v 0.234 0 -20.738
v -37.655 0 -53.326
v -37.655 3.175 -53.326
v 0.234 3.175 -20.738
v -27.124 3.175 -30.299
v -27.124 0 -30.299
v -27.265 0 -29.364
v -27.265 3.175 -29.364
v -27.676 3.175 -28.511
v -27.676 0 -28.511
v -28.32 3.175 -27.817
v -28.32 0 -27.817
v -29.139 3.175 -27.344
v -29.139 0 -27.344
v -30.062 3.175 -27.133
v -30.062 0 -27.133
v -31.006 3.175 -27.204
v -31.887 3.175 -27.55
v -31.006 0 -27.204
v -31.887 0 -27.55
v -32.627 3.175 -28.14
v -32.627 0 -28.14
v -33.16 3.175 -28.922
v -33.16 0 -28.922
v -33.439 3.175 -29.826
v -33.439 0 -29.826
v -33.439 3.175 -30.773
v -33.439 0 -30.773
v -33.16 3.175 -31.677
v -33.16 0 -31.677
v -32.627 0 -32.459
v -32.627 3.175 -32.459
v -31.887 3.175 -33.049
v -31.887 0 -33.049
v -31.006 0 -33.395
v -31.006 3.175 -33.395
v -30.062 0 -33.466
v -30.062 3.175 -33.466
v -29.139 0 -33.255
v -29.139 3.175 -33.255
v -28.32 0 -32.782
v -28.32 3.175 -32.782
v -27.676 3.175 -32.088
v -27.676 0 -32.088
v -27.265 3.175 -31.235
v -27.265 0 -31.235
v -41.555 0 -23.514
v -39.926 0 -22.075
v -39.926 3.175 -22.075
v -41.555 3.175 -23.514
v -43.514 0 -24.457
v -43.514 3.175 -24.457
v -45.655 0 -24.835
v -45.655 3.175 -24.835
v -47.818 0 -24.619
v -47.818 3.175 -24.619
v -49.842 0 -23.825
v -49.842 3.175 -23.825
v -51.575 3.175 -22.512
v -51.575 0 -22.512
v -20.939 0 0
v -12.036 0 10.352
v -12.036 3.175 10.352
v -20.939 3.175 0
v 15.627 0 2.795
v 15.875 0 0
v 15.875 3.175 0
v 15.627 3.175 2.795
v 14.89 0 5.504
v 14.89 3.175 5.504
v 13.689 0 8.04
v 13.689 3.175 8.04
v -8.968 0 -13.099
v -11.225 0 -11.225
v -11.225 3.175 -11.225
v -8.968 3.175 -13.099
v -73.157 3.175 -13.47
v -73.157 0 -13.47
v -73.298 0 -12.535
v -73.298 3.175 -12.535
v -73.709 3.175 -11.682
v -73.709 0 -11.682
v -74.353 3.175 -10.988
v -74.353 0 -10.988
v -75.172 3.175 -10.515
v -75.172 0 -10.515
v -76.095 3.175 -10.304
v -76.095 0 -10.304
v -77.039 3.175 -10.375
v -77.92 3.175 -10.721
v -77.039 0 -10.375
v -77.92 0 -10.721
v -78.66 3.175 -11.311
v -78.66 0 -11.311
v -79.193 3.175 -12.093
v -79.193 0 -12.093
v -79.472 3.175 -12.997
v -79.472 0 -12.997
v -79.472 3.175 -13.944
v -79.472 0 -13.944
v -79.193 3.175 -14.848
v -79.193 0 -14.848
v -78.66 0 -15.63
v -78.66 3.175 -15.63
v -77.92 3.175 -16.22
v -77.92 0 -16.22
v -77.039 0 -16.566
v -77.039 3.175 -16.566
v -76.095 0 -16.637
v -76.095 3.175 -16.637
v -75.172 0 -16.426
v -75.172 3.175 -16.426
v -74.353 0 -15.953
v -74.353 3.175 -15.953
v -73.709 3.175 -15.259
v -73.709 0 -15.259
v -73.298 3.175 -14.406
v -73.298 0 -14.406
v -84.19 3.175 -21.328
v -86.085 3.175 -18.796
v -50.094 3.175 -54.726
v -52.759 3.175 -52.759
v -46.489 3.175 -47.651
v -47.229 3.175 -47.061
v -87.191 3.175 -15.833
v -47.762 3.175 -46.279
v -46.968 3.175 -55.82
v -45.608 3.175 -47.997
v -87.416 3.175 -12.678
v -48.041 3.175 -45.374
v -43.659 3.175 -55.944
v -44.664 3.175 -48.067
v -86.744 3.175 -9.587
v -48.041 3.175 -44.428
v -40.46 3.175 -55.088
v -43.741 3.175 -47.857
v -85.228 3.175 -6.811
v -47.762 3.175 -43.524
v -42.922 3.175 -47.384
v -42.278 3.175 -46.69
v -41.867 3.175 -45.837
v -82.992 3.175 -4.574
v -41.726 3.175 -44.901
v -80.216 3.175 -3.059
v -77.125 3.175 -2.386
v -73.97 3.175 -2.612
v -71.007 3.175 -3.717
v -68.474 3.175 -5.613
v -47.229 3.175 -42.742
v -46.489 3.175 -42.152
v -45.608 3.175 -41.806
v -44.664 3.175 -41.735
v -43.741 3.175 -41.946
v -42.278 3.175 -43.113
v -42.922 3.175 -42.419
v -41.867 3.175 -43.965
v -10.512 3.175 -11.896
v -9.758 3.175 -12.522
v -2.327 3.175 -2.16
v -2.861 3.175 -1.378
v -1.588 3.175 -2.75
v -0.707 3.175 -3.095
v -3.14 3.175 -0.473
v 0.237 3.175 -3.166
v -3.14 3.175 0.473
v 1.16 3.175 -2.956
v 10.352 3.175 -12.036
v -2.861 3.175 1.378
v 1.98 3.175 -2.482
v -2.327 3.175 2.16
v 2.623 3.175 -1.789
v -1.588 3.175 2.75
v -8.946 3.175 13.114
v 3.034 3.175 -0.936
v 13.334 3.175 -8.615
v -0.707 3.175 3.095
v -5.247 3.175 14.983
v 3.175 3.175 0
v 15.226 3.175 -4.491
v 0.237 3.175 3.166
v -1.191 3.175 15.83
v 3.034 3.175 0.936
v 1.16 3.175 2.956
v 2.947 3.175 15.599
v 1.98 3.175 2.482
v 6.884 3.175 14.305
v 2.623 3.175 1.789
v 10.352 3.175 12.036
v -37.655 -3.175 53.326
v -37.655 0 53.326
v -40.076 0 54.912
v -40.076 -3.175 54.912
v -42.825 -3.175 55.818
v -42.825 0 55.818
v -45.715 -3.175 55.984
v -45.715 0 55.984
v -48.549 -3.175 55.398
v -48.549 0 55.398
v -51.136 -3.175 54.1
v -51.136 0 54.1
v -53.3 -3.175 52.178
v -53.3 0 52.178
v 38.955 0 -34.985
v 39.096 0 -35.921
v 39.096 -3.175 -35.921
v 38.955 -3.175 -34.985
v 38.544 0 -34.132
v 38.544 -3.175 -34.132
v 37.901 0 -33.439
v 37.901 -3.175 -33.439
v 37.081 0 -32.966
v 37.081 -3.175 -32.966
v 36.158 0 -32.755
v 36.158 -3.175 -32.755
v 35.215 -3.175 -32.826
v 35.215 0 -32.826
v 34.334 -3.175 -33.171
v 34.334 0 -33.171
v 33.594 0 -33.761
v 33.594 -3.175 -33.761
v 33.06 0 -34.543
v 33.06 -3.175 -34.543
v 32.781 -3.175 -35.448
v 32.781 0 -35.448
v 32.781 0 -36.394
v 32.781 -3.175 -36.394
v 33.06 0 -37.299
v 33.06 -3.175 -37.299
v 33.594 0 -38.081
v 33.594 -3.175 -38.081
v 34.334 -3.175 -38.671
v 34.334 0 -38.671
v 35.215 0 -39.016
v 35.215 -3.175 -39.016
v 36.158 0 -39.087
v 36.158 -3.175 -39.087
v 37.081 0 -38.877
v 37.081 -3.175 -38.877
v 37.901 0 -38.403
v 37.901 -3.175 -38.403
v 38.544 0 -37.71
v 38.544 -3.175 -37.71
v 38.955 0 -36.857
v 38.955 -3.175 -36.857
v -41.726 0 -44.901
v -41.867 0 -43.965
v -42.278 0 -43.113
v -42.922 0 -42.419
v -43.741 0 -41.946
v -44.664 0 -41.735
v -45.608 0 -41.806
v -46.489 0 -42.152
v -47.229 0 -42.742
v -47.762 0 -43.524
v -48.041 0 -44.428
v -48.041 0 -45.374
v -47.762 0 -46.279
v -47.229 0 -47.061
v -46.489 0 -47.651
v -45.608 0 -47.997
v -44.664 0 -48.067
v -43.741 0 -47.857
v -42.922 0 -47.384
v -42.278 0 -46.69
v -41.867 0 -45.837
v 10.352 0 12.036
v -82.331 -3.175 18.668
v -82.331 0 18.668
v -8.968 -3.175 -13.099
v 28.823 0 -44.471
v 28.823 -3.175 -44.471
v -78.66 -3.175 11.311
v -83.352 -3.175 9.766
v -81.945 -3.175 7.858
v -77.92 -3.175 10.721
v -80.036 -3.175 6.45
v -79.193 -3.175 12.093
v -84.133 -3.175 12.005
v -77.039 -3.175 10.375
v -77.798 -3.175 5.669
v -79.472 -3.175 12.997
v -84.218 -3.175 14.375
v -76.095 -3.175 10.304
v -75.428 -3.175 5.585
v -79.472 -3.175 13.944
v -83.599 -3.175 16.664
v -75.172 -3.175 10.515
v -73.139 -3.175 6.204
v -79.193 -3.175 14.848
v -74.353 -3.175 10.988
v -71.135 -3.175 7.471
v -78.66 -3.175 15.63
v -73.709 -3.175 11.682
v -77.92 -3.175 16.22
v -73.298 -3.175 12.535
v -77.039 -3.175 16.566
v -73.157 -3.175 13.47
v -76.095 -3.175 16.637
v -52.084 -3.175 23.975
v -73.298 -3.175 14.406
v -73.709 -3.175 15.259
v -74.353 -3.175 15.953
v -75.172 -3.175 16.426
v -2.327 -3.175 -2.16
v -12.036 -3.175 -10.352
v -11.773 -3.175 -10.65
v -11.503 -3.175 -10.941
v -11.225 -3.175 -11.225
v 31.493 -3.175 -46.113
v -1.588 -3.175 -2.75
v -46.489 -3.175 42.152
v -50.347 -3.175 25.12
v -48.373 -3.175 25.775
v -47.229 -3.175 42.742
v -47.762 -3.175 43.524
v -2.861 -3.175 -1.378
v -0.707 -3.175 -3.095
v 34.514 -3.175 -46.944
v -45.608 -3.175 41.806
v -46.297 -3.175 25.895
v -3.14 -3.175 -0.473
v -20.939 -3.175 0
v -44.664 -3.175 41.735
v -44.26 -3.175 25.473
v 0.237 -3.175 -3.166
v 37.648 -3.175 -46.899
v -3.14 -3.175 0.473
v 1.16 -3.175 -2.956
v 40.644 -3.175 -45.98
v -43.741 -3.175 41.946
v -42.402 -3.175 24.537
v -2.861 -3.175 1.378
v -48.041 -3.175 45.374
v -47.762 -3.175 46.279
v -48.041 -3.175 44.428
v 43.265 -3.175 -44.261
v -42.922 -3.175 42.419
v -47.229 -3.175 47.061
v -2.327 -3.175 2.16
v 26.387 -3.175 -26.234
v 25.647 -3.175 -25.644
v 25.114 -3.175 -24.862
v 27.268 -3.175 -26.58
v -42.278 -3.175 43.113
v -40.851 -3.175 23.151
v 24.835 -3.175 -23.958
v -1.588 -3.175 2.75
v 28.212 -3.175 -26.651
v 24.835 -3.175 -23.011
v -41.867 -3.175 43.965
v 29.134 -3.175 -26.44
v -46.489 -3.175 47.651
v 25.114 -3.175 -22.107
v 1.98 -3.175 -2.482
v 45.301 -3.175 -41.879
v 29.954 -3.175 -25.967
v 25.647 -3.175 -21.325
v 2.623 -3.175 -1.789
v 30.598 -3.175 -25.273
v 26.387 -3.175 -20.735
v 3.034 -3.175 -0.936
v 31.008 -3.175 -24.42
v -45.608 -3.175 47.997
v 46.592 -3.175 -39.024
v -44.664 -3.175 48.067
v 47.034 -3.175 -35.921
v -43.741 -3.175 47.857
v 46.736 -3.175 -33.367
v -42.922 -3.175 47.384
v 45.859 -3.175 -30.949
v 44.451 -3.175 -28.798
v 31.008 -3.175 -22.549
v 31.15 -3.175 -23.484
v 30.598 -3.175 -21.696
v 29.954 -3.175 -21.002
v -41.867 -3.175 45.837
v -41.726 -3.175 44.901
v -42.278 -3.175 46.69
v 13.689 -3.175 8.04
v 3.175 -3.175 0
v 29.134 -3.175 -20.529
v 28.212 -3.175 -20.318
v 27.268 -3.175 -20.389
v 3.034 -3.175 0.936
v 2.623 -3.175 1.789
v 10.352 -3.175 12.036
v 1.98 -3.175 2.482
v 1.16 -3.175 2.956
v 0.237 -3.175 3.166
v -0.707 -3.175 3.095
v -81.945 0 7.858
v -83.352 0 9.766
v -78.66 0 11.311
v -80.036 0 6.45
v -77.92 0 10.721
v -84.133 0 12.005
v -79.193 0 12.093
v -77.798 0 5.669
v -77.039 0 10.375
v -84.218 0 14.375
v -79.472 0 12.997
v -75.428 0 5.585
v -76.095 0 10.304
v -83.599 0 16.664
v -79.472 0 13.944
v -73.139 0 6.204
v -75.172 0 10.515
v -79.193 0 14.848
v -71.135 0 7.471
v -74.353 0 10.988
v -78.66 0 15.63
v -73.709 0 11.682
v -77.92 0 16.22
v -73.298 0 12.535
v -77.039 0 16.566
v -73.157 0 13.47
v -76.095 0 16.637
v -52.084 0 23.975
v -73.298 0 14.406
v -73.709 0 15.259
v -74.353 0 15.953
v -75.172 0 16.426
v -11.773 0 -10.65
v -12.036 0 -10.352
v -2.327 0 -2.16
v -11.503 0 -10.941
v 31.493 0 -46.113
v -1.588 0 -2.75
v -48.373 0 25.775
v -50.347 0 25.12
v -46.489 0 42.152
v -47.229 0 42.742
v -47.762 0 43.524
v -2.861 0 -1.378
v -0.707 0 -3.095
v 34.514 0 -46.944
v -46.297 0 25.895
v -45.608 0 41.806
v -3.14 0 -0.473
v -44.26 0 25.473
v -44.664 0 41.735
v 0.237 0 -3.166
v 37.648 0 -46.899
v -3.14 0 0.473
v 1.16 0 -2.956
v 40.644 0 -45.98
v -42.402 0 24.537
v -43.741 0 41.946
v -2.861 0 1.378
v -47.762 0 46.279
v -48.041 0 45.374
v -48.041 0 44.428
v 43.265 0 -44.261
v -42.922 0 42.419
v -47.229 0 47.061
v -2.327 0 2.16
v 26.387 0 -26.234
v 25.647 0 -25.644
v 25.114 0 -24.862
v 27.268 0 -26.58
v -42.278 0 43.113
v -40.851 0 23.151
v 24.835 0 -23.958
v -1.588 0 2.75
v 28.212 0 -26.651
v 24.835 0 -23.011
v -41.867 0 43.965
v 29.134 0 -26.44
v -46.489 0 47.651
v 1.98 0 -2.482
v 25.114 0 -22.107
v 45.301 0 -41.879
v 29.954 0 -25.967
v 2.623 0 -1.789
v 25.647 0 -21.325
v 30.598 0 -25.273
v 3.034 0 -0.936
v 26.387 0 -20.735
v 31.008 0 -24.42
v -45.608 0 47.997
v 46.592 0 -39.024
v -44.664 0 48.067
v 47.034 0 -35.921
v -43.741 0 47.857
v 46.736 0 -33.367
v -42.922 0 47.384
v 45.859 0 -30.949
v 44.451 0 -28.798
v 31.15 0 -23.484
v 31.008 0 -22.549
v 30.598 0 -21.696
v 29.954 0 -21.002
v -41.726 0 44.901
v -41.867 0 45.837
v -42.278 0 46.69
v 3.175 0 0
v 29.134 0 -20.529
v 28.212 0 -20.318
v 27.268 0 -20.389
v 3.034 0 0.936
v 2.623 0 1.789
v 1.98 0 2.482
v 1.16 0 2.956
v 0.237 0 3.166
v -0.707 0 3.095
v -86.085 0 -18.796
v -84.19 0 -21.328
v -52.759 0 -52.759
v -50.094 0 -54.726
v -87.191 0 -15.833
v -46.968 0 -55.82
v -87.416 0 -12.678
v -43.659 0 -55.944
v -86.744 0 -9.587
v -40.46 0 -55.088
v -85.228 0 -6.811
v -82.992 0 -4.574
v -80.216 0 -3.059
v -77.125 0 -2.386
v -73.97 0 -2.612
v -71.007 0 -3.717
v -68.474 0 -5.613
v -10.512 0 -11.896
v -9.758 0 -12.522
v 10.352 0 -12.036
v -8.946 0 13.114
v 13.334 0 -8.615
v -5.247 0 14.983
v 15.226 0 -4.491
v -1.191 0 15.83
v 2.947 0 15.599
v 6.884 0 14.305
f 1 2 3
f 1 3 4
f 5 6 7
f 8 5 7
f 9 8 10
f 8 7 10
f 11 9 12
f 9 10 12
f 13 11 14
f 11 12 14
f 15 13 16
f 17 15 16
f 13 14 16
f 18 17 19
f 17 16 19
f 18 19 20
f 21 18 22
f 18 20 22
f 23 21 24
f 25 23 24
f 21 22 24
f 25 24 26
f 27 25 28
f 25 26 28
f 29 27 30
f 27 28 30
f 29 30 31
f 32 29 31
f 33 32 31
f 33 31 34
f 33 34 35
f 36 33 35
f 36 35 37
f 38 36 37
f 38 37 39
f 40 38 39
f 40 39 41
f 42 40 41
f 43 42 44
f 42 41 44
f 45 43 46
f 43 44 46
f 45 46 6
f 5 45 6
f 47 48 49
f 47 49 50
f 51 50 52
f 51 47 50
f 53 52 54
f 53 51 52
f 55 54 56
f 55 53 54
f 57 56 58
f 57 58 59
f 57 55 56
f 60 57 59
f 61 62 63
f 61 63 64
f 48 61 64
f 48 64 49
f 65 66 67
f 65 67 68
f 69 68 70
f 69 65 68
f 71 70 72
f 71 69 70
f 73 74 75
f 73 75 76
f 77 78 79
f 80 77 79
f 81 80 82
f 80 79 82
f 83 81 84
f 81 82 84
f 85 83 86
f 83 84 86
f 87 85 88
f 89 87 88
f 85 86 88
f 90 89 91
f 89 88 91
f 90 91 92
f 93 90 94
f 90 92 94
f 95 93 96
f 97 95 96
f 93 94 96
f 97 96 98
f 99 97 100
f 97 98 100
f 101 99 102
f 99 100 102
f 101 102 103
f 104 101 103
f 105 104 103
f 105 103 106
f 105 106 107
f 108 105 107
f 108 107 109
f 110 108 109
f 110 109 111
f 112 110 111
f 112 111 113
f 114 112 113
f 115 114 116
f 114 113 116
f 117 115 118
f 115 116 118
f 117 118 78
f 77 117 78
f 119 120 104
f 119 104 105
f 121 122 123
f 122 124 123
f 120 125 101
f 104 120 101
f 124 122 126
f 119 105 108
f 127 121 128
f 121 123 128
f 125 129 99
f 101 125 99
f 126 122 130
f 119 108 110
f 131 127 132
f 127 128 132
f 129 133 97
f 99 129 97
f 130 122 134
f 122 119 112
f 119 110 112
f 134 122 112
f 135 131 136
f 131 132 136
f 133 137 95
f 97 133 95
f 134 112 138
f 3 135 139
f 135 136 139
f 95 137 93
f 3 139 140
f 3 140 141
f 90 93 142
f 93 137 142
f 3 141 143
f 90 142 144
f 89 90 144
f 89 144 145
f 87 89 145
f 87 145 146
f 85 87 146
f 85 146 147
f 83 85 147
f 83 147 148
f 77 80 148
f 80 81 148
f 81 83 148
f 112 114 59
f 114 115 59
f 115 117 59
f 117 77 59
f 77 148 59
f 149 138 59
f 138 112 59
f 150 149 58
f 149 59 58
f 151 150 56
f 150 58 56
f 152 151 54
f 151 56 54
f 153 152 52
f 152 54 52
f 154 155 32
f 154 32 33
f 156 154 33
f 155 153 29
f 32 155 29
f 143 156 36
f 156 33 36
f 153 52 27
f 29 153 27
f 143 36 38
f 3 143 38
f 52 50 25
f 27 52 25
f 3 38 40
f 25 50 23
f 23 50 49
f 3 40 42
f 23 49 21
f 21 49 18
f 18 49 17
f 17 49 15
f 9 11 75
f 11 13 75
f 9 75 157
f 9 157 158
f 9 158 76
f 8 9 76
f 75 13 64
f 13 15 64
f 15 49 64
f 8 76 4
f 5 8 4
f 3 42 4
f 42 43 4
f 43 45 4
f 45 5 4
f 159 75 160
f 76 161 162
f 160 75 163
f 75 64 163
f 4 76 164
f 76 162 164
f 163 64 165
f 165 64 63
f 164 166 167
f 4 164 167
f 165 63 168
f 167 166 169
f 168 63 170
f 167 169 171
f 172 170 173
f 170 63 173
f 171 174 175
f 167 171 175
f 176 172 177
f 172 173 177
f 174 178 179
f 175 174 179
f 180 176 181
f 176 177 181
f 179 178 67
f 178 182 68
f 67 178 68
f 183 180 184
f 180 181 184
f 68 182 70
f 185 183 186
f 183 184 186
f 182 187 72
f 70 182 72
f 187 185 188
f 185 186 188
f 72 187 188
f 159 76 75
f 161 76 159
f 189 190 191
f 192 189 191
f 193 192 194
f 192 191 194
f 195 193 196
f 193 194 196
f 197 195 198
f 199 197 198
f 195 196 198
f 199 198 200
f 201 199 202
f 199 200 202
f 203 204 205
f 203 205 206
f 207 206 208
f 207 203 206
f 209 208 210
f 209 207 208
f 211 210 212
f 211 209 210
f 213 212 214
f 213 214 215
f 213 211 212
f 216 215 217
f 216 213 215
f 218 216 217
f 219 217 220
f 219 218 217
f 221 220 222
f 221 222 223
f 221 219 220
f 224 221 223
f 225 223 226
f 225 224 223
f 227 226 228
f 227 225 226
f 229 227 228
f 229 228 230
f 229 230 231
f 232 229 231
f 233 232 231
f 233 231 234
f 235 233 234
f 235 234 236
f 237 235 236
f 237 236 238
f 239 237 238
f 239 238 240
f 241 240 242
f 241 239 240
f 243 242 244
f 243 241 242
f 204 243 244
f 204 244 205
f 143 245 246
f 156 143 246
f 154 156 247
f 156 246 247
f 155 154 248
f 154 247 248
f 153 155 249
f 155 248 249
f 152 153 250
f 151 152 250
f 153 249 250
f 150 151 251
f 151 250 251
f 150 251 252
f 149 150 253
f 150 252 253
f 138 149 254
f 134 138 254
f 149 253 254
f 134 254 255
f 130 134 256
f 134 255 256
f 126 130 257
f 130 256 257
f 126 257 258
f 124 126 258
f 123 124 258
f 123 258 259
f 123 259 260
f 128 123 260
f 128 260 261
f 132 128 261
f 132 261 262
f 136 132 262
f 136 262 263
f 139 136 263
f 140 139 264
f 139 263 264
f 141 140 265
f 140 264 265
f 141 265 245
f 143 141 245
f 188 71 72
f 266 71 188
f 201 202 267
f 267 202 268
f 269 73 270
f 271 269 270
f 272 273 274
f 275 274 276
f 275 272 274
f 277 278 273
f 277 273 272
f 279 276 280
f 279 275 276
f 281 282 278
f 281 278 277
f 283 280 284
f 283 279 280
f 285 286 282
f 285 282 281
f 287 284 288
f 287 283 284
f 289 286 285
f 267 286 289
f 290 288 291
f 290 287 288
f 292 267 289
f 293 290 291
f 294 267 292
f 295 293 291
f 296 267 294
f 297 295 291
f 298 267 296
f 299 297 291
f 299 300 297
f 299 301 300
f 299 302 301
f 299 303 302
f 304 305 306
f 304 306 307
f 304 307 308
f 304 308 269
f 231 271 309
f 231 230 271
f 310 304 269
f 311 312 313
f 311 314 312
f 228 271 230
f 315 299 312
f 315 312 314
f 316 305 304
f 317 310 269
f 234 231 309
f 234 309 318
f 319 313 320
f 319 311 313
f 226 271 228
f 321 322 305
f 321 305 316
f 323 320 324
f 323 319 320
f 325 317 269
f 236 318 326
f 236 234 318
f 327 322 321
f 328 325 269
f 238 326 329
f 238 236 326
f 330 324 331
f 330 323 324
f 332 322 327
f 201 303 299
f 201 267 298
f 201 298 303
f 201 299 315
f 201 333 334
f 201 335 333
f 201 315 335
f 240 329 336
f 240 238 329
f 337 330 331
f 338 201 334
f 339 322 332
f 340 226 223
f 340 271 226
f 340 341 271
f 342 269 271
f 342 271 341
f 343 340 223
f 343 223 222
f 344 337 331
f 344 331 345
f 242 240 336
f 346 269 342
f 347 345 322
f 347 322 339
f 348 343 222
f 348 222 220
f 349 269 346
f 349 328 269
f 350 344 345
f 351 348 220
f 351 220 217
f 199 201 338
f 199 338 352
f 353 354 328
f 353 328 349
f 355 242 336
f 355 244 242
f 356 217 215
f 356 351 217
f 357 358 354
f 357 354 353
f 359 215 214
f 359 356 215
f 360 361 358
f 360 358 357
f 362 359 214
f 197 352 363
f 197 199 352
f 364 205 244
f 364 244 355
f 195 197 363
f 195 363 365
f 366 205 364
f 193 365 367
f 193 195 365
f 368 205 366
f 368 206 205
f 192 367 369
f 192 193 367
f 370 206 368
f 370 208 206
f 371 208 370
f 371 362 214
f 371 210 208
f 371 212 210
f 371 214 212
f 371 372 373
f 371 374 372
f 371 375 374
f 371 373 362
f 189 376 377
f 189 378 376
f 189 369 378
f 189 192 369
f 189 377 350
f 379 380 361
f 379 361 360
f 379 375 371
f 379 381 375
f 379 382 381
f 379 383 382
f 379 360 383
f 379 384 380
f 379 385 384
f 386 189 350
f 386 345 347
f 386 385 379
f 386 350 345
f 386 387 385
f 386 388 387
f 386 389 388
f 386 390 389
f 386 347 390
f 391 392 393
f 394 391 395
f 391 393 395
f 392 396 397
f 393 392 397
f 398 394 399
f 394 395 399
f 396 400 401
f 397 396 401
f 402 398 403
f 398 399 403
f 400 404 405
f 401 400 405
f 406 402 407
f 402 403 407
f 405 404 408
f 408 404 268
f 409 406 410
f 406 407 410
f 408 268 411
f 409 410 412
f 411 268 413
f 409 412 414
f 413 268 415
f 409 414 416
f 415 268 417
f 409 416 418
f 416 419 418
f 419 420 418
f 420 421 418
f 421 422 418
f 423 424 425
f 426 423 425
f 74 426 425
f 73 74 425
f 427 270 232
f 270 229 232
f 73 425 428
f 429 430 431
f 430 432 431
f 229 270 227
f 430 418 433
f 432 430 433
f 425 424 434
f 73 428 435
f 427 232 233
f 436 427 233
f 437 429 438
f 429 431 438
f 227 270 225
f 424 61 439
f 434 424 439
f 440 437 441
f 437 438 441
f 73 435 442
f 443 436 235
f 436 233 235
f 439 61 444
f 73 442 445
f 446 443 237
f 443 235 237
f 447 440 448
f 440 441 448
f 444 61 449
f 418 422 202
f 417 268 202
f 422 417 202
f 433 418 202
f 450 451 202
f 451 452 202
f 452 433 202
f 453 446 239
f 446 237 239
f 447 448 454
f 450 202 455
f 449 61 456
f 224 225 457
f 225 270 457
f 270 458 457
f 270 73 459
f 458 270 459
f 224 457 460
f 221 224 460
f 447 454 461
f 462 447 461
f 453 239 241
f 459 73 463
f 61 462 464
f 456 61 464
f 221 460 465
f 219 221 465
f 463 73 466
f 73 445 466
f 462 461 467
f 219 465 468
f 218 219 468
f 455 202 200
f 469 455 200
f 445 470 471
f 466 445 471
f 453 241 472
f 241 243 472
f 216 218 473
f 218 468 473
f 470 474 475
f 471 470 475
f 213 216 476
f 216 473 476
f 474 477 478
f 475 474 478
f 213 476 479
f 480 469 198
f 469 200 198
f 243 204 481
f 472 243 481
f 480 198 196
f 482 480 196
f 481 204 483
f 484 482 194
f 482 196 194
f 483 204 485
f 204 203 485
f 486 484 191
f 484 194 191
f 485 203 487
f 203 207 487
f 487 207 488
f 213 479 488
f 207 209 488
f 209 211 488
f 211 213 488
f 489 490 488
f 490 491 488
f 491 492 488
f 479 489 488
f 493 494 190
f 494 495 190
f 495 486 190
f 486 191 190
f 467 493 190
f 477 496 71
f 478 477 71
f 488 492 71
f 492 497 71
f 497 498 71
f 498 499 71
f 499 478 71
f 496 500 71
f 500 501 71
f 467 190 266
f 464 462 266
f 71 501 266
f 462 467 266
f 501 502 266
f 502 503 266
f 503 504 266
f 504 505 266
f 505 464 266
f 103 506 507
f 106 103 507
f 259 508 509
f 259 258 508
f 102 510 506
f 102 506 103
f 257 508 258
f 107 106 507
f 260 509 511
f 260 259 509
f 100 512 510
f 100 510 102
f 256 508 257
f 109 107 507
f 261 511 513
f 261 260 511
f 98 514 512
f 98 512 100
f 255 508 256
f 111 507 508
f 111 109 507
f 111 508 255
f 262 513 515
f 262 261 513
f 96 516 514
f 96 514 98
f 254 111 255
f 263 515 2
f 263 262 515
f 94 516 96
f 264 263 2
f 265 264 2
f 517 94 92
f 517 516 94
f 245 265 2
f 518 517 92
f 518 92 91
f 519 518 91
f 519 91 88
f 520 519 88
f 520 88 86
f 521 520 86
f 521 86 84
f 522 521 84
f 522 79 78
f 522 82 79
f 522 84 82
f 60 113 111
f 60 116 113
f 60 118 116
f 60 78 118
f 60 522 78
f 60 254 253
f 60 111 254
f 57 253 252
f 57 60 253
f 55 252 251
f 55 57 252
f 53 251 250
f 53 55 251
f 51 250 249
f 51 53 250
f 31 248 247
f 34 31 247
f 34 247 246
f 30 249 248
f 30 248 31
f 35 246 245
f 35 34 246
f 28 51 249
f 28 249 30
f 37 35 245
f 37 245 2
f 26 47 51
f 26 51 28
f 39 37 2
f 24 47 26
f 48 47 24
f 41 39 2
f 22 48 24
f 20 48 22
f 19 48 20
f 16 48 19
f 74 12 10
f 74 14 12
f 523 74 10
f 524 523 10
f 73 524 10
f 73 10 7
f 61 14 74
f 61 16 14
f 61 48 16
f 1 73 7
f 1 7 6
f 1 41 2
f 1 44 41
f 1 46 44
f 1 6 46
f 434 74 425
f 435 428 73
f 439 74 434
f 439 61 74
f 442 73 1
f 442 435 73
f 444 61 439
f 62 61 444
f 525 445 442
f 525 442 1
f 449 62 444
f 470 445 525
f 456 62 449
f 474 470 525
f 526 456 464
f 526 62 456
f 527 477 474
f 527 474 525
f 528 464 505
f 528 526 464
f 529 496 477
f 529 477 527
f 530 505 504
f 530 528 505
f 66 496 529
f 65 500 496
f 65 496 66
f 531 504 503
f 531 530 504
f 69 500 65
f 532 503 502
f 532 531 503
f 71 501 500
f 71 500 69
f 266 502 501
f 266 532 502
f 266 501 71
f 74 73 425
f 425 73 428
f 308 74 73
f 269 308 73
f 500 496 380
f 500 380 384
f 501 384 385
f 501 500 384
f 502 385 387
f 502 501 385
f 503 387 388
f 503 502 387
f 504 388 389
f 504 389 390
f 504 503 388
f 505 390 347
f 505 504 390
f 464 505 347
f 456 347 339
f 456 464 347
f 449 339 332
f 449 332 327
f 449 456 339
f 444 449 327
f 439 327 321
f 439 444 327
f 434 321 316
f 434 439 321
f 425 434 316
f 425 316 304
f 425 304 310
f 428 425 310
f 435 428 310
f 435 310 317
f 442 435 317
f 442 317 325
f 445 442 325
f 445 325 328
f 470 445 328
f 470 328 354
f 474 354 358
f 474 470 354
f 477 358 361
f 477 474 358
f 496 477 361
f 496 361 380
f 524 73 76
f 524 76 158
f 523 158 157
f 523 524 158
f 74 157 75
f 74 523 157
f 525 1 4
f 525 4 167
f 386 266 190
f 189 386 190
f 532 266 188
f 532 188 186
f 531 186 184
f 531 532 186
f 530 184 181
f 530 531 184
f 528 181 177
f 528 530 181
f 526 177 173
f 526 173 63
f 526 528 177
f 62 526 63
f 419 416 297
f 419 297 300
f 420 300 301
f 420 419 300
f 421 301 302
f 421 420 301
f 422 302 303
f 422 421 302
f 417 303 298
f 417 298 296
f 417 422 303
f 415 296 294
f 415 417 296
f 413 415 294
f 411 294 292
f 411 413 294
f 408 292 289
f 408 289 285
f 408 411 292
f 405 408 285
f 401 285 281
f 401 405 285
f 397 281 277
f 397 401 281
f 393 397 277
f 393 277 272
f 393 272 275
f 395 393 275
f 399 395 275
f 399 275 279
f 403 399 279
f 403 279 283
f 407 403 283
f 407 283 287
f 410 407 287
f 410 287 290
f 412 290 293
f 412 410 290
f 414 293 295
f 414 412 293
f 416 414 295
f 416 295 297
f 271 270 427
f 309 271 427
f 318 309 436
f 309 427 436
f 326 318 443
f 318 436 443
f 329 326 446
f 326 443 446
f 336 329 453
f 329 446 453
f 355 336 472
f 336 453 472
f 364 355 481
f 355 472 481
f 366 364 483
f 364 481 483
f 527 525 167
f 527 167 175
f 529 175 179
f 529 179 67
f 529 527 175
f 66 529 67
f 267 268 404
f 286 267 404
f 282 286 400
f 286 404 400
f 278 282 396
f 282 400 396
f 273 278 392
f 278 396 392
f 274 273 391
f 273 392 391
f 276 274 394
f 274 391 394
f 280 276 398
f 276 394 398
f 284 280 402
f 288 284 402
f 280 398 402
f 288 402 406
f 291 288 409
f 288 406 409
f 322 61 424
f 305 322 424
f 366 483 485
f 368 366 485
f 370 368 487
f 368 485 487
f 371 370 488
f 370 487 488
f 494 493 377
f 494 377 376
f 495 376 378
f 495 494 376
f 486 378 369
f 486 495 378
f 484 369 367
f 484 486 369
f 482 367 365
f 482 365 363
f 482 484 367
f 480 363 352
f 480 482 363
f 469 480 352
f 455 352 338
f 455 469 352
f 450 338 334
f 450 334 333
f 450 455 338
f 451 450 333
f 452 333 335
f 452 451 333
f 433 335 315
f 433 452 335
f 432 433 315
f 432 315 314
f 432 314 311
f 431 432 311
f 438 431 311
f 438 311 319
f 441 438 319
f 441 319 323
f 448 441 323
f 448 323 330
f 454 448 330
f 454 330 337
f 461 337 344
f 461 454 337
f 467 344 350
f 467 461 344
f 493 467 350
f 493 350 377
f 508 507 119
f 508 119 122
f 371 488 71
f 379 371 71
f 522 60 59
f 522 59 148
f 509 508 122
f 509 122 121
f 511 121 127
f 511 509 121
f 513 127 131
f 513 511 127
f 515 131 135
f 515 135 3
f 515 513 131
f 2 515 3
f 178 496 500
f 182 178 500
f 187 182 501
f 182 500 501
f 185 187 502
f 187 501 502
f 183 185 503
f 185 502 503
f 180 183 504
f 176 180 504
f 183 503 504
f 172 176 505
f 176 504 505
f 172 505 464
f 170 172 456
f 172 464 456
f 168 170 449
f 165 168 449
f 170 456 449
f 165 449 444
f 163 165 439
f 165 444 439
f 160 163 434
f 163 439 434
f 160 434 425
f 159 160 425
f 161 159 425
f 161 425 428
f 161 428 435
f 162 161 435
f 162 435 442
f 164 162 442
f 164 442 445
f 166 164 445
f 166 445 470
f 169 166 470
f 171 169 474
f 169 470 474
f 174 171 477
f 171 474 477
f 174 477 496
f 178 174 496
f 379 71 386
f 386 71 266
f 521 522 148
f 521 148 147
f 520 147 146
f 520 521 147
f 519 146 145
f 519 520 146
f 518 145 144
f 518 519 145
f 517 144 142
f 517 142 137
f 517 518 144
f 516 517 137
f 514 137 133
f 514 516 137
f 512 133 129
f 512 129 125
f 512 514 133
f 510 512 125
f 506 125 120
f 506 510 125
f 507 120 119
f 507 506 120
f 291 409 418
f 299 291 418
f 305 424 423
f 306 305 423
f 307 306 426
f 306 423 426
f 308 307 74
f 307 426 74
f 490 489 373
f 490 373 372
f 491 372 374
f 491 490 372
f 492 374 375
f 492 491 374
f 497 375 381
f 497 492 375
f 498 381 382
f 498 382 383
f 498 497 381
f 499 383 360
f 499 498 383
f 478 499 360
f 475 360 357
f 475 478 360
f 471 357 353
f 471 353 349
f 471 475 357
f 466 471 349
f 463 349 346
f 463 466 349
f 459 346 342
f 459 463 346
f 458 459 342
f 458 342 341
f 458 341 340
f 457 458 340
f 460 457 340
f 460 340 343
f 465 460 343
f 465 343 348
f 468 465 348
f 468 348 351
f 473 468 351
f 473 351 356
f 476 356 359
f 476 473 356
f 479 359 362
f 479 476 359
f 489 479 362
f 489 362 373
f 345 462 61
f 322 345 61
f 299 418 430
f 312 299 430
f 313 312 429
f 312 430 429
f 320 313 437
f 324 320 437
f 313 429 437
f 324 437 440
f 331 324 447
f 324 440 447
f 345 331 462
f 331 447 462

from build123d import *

# Parameters (mm, degrees)
F0_R     = 3.175
F1_DEPTH = 3.175
F2_DEPTH = 3.175


with BuildPart() as f1:
    # F0 (on Front) → F1 (new body)
    with BuildSketch(Plane.XZ):
        with BuildLine():
            ThreePointArc((-82.331405076, 18.6678036462), (-73.5586383483, 20.9075469092), (-68.3946770291, 13.4703841816))
            ThreePointArc((-68.3946770291, 13.4703841816), (-69.1121208226, 10.1727039932), (-71.1347575644, 7.4711561347))
            Line((-71.1347575644, 7.4711561347), (-52.0843267669, 23.9754595323))
            ThreePointArc((-52.0843267669, 23.9754595323), (-46.2965222838, 25.8954961667), (-40.8511612346, 23.1508168672))
            Line((-40.8511612346, 23.1508168672), (-20.9391765456, 0))
            Line((-20.9391765456, 0), (-12.0356034274, 10.3518054047))
            ThreePointArc((-12.0356034274, 10.3518054047), (-1.190625, 15.8302885984), (10.3518054047, 12.0356034274))
            Line((10.3518054047, 12.0356034274), (-37.655016822, 53.3262030046))
            ThreePointArc((-37.655016822, 53.3262030046), (-34.8014845049, 49.5361241819), (-33.7887806053, 44.9012806053))
            ThreePointArc((-33.7887806053, 44.9012806053), (-48.7842347585, 34.4892527868), (-53.300199871, 52.1776678558))
            Line((-53.300199871, 52.1776678558), (-82.331405076, 18.6678036462))
        make_face()
        with BuildLine():
            ThreePointArc((-37.655016822, 53.3262030046), (-45.7148756595, 55.9839571475), (-53.300199871, 52.1776678558))
            ThreePointArc((-53.300199871, 52.1776678558), (-48.7842347585, 34.4892527868), (-33.7887806053, 44.9012806053))
            ThreePointArc((-33.7887806053, 44.9012806053), (-34.8014845049, 49.5361241819), (-37.655016822, 53.3262030046))
        make_face()
        with Locations((-44.9012806053, 44.9012806053)):
            Circle(F0_R, mode=Mode.SUBTRACT)
        with BuildLine():
            ThreePointArc((-71.1347575644, 7.4711561347), (-69.1121208226, 10.1727039932), (-68.3946770291, 13.4703841816))
            ThreePointArc((-68.3946770291, 13.4703841816), (-73.5586383483, 20.9075469092), (-82.331405076, 18.6678036462))
            ThreePointArc((-82.331405076, 18.6678036462), (-81.9448371048, 7.8577241059), (-71.1347575644, 7.4711561347))
        make_face()
        with Locations((-76.3321770291, 13.4703841816)):
            Circle(F0_R, mode=Mode.SUBTRACT)
        with BuildLine():
            Line((13.6886557503, 8.0396721793), (10.3518054047, 12.0356034274))
            ThreePointArc((10.3518054047, 12.0356034274), (-1.190625, 15.8302885984), (-12.0356034274, 10.3518054047))
            ThreePointArc((-12.0356034274, 10.3518054047), (-15.875, 0), (-12.0356034274, -10.3518054047))
            ThreePointArc((-12.0356034274, -10.3518054047), (-11.6386596495, -10.7961672163), (-11.2253201513, -11.2253201513))
            Line((-11.2253201513, -11.2253201513), (-8.9677419672, -13.0994362096))
            ThreePointArc((-8.9677419672, -13.0994362096), (0.8728361512, -15.8509867848), (10.3518054047, -12.0356034274))
            ThreePointArc((10.3518054047, -12.0356034274), (14.4282801435, -6.6212051093), (15.875, 0))
            ThreePointArc((15.875, 0), (15.3186656572, 4.1658261464), (13.6886557503, 8.0396721793))
        make_face()
        Circle(F0_R, mode=Mode.SUBTRACT)
        with BuildLine():
            Line((44.4506274521, -28.7982771588), (13.6886557503, 8.0396721793))
            ThreePointArc((13.6886557503, 8.0396721793), (15.3186656572, 4.1658261464), (15.875, 0))
            ThreePointArc((15.875, 0), (14.4282801435, -6.6212051093), (10.3518054047, -12.0356034274))
            Line((10.3518054047, -12.0356034274), (0.2338236979, -20.7380651153))
            Line((0.2338236979, -20.7380651153), (28.8230791183, -44.4712775701))
            ThreePointArc((28.8230791183, -44.4712775701), (28.0518983355, -28.0747189903), (44.4506274521, -28.7982771588))
        make_face()
        with Locations((27.9745180668, -23.4843900063)):
            Circle(F0_R, mode=Mode.SUBTRACT)
        with BuildLine():
            ThreePointArc((47.0335244843, -35.9210244843), (46.3678629828, -32.132723858), (44.4506274521, -28.7982771588))
            ThreePointArc((44.4506274521, -28.7982771588), (28.0518983355, -28.0747189903), (28.8230791183, -44.4712775701))
            ThreePointArc((28.8230791183, -44.4712775701), (40.6439334592, -45.9799402839), (47.0335244843, -35.9210244843))
        make_face()
        with Locations((35.9210244843, -35.9210244843)):
            Circle(F0_R, mode=Mode.SUBTRACT)
        with BuildLine():
            Line((0.2338236979, -20.7380651153), (10.3518054047, -12.0356034274))
            ThreePointArc((10.3518054047, -12.0356034274), (0.8728361512, -15.8509867848), (-8.9677419672, -13.0994362096))
            Line((-8.9677419672, -13.0994362096), (0.2338236979, -20.7380651153))
        make_face()
        with BuildLine():
            Line((-12.0356034274, 10.3518054047), (-20.9391765456, 0))
            Line((-20.9391765456, 0), (-12.0356034274, -10.3518054047))
            ThreePointArc((-12.0356034274, -10.3518054047), (-15.875, 0), (-12.0356034274, 10.3518054047))
        make_face()
    extrude(amount=F1_DEPTH)


with BuildPart() as f2:
    # F0 (on Front) → F2 (new body)
    with BuildSketch(Plane.XZ):
        with BuildLine():
            ThreePointArc((-65.2196770291, -13.4703841816), (-66.0655657241, -9.2178145394), (-68.4744529232, -5.6126600757))
            ThreePointArc((-68.4744529232, -5.6126600757), (-84.189901135, -5.6126600757), (-84.189901135, -21.3281082875))
            ThreePointArc((-84.189901135, -21.3281082875), (-72.0796073869, -23.7369954866), (-65.2196770291, -13.4703841816))
        make_face()
        with Locations((-76.3321770291, -13.4703841816)):
            Circle(F0_R, mode=Mode.SUBTRACT)
        with BuildLine():
            Line((-12.0356034274, -10.3518054047), (-20.9391765456, 0))
            Line((-20.9391765456, 0), (-39.9257294986, -22.0748567869))
            ThreePointArc((-39.9257294986, -22.0748567869), (-45.654817053, -24.8352728006), (-51.5748000268, -22.512312972))
            Line((-51.5748000268, -22.512312972), (-68.4744529232, -5.6126600757))
            ThreePointArc((-68.4744529232, -5.6126600757), (-66.0655657241, -9.2178145394), (-65.2196770291, -13.4703841816))
            ThreePointArc((-65.2196770291, -13.4703841816), (-72.0796073869, -23.7369954866), (-84.189901135, -21.3281082875))
            Line((-84.189901135, -21.3281082875), (-52.7590047113, -52.7590047113))
            ThreePointArc((-52.7590047113, -52.7590047113), (-49.1538502475, -34.6346693003), (-33.7887806053, -44.9012806053))
            ThreePointArc((-33.7887806053, -44.9012806053), (-34.8014845049, -49.5361241819), (-37.655016822, -53.3262030046))
            Line((-37.655016822, -53.3262030046), (0.2338236979, -20.7380651153))
            Line((0.2338236979, -20.7380651153), (-8.9677419672, -13.0994362096))
            ThreePointArc((-8.9677419672, -13.0994362096), (-10.1399219514, -12.2146472655), (-11.2253201513, -11.2253201513))
            ThreePointArc((-11.2253201513, -11.2253201513), (-11.6386596495, -10.7961672163), (-12.0356034274, -10.3518054047))
        make_face()
        with Locations((-30.2993841525, -30.2993841525)):
            Circle(F0_R, mode=Mode.SUBTRACT)
        with BuildLine():
            ThreePointArc((-52.7590047113, -52.7590047113), (-45.3182930842, -56.0059533535), (-37.655016822, -53.3262030046))
            ThreePointArc((-37.655016822, -53.3262030046), (-34.8014845049, -49.5361241819), (-33.7887806053, -44.9012806053))
            ThreePointArc((-33.7887806053, -44.9012806053), (-49.1538502475, -34.6346693003), (-52.7590047113, -52.7590047113))
        make_face()
        with Locations((-44.9012806053, -44.9012806053)):
            Circle(F0_R, mode=Mode.SUBTRACT)
        with BuildLine():
            Line((13.6886557503, 8.0396721793), (10.3518054047, 12.0356034274))
            ThreePointArc((10.3518054047, 12.0356034274), (-1.190625, 15.8302885984), (-12.0356034274, 10.3518054047))
            ThreePointArc((-12.0356034274, 10.3518054047), (-15.875, 0), (-12.0356034274, -10.3518054047))
            ThreePointArc((-12.0356034274, -10.3518054047), (-11.6386596495, -10.7961672163), (-11.2253201513, -11.2253201513))
            Line((-11.2253201513, -11.2253201513), (-8.9677419672, -13.0994362096))
            ThreePointArc((-8.9677419672, -13.0994362096), (0.8728361512, -15.8509867848), (10.3518054047, -12.0356034274))
            ThreePointArc((10.3518054047, -12.0356034274), (14.4282801435, -6.6212051093), (15.875, 0))
            ThreePointArc((15.875, 0), (15.3186656572, 4.1658261464), (13.6886557503, 8.0396721793))
        make_face()
        Circle(F0_R, mode=Mode.SUBTRACT)
        with BuildLine():
            Line((-12.0356034274, 10.3518054047), (-20.9391765456, 0))
            Line((-20.9391765456, 0), (-12.0356034274, -10.3518054047))
            ThreePointArc((-12.0356034274, -10.3518054047), (-15.875, 0), (-12.0356034274, 10.3518054047))
        make_face()
        with BuildLine():
            Line((0.2338236979, -20.7380651153), (10.3518054047, -12.0356034274))
            ThreePointArc((10.3518054047, -12.0356034274), (0.8728361512, -15.8509867848), (-8.9677419672, -13.0994362096))
            Line((-8.9677419672, -13.0994362096), (0.2338236979, -20.7380651153))
        make_face()
    extrude(amount=-F2_DEPTH)


solid = Compound([f1.part, f2.part])
